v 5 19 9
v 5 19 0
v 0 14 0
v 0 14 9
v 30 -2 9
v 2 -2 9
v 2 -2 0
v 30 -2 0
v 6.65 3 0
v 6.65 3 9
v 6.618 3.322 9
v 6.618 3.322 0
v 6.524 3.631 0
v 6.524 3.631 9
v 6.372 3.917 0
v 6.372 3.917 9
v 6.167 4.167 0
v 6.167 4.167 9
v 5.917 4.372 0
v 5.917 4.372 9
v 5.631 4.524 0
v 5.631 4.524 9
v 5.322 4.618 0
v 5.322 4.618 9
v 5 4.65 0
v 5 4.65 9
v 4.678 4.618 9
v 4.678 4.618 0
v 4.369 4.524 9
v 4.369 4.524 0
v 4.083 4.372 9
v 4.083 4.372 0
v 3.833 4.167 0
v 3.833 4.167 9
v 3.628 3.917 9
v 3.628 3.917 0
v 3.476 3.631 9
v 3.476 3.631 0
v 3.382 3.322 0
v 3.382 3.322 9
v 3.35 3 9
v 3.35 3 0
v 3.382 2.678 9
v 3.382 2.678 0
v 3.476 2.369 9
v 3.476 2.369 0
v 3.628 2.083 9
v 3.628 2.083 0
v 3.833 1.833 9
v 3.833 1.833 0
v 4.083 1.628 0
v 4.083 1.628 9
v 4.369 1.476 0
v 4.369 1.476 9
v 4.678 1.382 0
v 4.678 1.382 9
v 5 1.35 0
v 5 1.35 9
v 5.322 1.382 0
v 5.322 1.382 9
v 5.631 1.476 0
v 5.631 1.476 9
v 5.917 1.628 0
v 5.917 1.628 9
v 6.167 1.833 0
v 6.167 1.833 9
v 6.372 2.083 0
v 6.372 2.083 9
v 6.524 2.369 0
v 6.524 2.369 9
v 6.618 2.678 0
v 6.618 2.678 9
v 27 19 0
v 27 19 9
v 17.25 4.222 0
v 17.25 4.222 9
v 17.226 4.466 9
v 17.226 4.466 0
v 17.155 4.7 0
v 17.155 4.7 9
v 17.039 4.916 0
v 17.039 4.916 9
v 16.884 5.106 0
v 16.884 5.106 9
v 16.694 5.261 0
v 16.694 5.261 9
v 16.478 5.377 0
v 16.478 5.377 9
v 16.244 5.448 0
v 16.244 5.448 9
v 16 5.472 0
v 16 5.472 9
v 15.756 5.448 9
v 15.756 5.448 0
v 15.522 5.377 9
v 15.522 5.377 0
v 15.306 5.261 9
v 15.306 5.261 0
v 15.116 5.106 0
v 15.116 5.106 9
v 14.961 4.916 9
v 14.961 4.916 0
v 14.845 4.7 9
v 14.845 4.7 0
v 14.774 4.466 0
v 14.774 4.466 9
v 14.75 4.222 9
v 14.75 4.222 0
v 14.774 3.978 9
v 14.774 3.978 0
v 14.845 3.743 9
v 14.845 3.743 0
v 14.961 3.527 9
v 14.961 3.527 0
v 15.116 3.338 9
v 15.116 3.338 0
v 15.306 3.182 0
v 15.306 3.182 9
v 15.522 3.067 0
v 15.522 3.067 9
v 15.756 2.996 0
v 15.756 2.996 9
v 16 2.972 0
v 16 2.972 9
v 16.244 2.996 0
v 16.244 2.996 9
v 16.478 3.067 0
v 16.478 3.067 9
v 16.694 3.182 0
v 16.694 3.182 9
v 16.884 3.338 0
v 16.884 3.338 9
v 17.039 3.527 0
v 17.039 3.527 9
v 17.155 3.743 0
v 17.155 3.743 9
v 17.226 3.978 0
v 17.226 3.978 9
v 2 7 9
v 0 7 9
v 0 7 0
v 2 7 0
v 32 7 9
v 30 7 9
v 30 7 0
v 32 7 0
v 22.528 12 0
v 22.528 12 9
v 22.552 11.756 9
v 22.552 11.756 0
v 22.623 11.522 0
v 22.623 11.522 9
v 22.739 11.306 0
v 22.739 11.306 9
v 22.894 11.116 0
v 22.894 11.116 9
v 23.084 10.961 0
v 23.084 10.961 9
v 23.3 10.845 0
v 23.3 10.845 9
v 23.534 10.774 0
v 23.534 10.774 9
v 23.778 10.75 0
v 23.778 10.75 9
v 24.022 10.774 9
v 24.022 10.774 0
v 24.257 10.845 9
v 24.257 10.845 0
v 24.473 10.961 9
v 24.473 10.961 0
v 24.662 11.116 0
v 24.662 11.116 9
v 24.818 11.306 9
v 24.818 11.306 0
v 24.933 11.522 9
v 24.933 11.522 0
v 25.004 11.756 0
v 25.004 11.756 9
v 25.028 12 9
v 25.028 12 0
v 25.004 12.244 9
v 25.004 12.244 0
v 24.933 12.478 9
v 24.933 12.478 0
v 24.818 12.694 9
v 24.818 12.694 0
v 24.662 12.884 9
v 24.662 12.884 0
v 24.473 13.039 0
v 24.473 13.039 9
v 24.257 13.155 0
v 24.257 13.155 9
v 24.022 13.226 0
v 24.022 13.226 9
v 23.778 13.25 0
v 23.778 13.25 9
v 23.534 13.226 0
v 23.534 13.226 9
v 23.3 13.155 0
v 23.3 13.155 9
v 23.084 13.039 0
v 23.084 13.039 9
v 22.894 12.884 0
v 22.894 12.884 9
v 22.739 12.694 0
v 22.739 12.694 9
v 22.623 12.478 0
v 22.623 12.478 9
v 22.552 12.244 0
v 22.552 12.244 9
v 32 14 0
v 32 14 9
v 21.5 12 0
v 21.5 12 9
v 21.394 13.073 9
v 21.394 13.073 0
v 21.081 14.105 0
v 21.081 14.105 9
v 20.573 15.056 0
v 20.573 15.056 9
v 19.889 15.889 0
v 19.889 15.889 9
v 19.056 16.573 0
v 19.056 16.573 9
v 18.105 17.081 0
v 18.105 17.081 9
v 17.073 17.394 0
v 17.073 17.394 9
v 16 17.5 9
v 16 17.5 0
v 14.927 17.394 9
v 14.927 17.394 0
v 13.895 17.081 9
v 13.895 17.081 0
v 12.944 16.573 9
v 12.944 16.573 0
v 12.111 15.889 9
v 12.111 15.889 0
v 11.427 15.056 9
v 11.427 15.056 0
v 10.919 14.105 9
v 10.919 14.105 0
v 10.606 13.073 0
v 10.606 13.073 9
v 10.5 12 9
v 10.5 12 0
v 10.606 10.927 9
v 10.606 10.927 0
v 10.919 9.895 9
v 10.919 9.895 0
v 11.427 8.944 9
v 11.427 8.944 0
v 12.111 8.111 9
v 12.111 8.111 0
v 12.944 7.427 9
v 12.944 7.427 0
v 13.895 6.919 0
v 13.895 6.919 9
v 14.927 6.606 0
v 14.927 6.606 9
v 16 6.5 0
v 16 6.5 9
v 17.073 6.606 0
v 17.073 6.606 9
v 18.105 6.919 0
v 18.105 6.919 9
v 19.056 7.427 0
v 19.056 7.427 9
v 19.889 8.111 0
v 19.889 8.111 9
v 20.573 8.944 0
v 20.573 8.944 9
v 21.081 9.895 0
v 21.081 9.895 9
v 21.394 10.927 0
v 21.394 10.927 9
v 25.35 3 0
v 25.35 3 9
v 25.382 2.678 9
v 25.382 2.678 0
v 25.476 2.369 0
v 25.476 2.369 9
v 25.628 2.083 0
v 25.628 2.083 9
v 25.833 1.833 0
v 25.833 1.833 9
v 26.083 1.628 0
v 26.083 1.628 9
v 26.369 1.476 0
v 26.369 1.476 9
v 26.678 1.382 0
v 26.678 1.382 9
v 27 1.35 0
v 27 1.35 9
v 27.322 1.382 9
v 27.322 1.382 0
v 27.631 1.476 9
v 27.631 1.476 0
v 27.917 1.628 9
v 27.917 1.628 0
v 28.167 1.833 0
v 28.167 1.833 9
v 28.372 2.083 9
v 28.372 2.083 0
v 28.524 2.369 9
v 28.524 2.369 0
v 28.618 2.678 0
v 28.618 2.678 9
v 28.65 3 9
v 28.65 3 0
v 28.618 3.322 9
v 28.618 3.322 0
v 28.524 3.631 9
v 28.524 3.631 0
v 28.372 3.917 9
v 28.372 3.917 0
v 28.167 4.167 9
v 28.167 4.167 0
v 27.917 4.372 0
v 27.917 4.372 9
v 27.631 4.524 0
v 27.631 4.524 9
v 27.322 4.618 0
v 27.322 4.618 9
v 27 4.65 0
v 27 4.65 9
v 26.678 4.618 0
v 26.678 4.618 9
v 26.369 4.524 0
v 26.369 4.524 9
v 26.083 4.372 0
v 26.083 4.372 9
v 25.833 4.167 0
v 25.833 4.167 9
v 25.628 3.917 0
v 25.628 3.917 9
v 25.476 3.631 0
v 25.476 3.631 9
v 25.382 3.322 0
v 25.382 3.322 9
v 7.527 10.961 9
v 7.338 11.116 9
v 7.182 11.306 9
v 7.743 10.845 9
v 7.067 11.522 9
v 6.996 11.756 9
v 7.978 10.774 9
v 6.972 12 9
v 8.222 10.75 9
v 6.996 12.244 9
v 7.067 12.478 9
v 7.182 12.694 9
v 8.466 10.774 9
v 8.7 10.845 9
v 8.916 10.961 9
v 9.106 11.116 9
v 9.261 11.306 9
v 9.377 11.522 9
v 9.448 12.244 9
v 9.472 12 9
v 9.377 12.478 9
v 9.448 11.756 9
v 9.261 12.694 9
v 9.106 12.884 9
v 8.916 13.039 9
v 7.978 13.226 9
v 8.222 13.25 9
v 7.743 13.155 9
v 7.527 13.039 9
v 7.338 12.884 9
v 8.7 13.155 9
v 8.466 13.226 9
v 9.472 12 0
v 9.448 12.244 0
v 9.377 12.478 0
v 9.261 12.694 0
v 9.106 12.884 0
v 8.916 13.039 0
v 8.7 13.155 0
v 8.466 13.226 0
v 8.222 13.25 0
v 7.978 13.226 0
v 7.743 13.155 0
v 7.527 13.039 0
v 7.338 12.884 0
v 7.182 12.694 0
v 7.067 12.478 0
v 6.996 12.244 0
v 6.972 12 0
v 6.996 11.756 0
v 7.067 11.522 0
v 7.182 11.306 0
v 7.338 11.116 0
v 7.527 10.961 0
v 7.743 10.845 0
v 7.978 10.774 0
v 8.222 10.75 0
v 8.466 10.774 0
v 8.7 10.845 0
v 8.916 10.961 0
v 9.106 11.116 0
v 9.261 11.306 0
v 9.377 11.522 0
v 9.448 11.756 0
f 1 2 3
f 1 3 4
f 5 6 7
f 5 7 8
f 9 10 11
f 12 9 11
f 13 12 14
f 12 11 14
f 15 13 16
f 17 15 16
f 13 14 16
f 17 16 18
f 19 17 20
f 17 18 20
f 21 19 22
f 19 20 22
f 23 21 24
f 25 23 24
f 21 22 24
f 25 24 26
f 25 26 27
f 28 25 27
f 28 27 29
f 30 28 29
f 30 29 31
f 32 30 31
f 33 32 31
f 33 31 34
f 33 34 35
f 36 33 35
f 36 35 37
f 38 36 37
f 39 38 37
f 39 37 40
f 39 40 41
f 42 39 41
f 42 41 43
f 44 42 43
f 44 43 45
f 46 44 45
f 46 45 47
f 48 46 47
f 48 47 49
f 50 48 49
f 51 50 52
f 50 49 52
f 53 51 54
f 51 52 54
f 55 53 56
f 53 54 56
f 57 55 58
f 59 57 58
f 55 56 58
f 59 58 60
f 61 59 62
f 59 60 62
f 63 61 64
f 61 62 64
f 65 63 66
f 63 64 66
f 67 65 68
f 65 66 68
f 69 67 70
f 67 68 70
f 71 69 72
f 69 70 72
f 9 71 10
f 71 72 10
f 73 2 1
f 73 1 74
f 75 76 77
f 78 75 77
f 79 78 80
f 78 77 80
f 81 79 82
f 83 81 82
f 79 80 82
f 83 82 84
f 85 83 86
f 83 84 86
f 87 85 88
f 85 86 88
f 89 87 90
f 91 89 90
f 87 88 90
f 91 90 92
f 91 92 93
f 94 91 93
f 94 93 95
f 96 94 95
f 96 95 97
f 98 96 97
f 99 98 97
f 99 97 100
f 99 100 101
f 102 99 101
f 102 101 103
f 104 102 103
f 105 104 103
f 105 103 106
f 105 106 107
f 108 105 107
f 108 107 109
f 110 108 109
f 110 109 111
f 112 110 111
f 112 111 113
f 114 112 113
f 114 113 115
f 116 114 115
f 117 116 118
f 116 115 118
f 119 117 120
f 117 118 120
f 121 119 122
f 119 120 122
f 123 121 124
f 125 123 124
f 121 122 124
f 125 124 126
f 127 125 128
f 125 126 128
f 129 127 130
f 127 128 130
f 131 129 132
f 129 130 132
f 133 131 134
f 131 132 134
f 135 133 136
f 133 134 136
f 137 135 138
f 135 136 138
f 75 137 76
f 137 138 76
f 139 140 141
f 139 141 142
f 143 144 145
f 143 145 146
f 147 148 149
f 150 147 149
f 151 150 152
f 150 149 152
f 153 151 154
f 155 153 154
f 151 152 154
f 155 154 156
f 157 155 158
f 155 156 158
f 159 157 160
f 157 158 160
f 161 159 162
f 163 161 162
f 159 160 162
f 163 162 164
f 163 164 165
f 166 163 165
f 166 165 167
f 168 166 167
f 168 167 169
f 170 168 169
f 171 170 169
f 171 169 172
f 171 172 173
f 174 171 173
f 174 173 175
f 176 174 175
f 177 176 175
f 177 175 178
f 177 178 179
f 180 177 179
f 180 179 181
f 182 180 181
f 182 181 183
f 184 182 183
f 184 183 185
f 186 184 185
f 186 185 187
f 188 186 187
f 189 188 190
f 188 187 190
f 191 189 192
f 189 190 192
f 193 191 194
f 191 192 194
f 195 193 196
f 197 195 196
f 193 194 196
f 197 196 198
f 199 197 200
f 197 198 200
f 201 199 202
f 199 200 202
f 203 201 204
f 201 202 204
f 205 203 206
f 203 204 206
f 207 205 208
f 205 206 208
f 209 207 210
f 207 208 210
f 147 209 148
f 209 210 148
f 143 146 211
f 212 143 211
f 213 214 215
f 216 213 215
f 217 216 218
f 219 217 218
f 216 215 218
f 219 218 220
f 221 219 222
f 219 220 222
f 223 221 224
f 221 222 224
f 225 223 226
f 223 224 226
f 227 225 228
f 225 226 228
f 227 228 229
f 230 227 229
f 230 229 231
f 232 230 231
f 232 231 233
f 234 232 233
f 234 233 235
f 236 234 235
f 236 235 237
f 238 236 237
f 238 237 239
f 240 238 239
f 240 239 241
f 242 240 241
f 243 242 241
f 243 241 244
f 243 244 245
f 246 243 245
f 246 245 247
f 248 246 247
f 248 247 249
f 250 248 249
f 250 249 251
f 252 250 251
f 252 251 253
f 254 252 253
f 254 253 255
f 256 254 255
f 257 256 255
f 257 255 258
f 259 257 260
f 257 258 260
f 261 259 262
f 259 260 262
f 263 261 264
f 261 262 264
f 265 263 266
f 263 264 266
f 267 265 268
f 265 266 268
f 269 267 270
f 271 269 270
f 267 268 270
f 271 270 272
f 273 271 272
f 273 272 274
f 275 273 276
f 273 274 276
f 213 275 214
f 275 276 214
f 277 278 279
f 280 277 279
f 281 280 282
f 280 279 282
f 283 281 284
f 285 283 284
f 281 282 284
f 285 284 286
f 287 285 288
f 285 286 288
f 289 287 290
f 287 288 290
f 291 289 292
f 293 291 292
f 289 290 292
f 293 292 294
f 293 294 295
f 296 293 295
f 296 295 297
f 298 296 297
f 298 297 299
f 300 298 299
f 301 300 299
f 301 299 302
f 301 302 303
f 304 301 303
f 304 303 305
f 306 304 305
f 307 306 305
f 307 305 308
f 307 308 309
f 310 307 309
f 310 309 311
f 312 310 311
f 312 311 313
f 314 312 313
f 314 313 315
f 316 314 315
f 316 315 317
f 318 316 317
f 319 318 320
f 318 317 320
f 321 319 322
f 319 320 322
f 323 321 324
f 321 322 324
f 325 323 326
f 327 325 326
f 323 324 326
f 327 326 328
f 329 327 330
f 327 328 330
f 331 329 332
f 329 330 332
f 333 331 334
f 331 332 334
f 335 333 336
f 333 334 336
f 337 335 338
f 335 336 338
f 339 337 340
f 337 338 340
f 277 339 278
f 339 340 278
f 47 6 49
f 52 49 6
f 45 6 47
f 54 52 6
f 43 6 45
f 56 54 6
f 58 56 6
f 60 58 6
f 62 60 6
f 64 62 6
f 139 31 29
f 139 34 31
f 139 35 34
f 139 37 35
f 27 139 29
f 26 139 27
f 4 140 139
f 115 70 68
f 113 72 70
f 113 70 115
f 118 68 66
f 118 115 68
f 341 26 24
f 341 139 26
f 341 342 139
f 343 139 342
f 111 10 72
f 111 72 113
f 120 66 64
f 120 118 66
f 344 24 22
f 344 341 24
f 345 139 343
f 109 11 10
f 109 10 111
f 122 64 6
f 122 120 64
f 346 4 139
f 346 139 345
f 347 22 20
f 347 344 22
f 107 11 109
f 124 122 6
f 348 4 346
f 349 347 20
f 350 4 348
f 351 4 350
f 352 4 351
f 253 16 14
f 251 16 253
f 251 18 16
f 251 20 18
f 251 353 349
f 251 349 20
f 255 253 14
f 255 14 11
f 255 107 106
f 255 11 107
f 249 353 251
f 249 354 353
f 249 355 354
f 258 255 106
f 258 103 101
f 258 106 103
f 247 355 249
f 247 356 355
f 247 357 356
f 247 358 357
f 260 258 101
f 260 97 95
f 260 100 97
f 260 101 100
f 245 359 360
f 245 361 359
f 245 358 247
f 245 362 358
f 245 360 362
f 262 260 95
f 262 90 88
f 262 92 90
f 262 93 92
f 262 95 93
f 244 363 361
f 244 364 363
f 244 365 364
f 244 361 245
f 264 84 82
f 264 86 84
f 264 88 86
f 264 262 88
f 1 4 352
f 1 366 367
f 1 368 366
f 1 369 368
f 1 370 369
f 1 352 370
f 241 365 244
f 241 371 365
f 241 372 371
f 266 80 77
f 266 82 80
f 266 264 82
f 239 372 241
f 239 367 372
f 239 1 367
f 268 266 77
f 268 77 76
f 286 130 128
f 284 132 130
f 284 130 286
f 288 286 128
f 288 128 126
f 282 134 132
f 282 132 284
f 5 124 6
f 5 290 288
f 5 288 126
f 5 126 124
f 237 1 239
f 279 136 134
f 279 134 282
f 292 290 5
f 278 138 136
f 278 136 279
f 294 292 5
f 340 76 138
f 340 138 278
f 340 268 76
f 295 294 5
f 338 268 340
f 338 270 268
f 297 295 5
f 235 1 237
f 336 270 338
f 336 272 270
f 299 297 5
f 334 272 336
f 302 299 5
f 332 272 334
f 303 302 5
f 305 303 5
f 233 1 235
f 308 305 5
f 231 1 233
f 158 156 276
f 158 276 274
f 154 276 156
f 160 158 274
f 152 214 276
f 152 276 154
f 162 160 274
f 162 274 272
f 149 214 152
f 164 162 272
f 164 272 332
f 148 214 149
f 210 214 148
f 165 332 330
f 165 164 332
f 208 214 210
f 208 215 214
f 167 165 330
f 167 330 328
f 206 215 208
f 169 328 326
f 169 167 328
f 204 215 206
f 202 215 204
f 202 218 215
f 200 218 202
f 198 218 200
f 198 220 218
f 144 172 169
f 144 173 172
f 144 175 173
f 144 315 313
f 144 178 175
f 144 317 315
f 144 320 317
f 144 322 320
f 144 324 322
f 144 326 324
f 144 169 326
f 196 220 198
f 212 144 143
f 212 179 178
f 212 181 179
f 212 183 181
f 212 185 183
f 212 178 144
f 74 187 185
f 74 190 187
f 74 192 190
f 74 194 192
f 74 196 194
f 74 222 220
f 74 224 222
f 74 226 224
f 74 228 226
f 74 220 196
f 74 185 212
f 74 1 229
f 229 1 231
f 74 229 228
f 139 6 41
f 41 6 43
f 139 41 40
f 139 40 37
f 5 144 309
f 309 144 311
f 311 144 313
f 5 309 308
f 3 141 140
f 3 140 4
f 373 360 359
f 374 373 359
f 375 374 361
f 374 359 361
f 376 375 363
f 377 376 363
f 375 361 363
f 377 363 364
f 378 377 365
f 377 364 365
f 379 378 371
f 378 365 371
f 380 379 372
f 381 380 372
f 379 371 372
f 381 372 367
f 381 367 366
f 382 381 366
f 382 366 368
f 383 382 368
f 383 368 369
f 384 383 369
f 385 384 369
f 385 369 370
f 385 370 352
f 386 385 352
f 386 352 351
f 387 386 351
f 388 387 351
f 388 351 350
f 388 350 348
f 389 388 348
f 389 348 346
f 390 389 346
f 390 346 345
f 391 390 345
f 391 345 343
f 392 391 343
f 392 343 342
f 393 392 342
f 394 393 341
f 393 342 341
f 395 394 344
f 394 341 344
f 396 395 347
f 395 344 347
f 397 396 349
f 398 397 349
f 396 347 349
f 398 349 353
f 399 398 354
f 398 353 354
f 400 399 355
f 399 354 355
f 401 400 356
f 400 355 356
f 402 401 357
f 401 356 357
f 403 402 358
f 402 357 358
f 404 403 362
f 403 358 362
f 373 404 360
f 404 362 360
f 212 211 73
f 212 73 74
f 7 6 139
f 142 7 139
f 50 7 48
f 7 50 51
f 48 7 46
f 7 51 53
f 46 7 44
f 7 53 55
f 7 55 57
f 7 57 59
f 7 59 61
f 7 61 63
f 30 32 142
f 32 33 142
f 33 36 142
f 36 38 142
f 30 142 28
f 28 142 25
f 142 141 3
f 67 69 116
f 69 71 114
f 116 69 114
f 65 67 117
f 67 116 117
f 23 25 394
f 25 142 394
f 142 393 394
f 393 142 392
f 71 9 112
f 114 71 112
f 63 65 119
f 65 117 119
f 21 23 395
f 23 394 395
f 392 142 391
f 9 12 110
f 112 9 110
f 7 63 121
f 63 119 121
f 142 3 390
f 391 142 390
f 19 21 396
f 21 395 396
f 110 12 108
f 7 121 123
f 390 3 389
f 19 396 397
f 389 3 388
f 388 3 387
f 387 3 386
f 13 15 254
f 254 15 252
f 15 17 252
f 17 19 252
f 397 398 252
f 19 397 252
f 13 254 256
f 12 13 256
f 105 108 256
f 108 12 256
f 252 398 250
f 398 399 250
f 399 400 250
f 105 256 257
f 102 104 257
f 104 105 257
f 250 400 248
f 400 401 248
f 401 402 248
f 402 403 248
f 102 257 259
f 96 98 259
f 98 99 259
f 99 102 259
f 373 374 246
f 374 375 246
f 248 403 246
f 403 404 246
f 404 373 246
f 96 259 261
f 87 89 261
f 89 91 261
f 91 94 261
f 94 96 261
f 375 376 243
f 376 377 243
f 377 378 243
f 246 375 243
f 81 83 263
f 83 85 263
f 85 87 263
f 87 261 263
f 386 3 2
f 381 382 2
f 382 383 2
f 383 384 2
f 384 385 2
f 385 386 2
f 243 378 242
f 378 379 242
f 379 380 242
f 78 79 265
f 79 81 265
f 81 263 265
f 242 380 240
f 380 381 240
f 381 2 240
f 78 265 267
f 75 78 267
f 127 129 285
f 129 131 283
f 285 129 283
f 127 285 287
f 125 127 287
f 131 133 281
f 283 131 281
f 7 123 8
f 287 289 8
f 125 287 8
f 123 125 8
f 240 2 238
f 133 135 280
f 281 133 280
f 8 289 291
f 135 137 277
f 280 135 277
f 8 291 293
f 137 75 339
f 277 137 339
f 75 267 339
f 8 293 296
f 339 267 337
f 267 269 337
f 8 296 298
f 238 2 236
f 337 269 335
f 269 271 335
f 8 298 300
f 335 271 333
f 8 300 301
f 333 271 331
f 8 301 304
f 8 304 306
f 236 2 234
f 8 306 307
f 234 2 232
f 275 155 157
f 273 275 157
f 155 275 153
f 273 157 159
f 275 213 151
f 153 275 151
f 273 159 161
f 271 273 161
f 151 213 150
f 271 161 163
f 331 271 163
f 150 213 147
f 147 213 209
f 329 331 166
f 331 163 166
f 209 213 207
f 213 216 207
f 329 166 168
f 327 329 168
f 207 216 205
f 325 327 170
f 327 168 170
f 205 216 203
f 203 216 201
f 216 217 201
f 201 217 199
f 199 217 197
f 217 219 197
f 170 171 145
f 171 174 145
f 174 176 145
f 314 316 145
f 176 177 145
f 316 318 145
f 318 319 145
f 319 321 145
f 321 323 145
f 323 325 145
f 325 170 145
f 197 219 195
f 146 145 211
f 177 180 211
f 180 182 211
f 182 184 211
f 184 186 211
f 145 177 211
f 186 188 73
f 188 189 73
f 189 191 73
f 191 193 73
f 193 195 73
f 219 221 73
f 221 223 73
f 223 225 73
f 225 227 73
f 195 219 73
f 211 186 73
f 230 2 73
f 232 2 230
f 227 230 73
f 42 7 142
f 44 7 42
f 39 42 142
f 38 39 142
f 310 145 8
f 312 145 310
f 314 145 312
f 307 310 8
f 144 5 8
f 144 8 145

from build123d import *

# Parameters (mm, degrees)
ESQUISSE1_W             = 32
ESQUISSE1_H             = 19
BOSS_EXTRU_1_DEPTH      = 9
ESQUISSE2_R             = 5.5
ESQUISSE2_R_2           = 1.25
ESQUISSE2_R_3           = 1.65
ENL_V_MAT_EXTRU_1_DEPTH = 39.288379438
ESQUISSE3_W             = 2
ESQUISSE3_H             = 7
ENL_V_MAT_EXTRU_2_DEPTH = 39.288379438
ESQUISSE4_W             = 28
ESQUISSE4_H             = 2
BOSS_EXTRU_2_DEPTH      = 9
CHANFREIN1_SIZE         = 5


with BuildPart() as part:
    # Esquisse1 → Boss.-Extru.1 (new body)
    with BuildSketch(Plane.XY):
        with Locations((16, 9.5)):
            Rectangle(ESQUISSE1_W, ESQUISSE1_H)
    extrude(amount=BOSS_EXTRU_1_DEPTH)

    # Esquisse2 → Enlèv. mat.-Extru.1 (cut, through all)
    with BuildSketch(Plane.XY.offset(9)):
        with Locations((16, 12)):
            Circle(ESQUISSE2_R)
        with Locations((8.221825407, 12)):
            Circle(ESQUISSE2_R_2)
        with Locations(Location((23.778174593, 12, 0), (0, 0, 180))):
            Circle(ESQUISSE2_R_2)
        with Locations((16, 4.221825407)):
            Circle(ESQUISSE2_R_2)
        with Locations((5, 3)):
            Circle(ESQUISSE2_R_3)
        with Locations(Location((27, 3, 0), (0, 0, 180))):
            Circle(ESQUISSE2_R_3)
    extrude(amount=-ENL_V_MAT_EXTRU_1_DEPTH, mode=Mode.SUBTRACT)

    # Esquisse3 → Enlèv. mat.-Extru.2 (cut, through all)
    with BuildSketch(Plane.XY.offset(9)):
        with Locations((1, 3.5)):
            Rectangle(ESQUISSE3_W, ESQUISSE3_H)
        with Locations((31, 3.5)):
            Rectangle(ESQUISSE3_W, ESQUISSE3_H)
    extrude(amount=-ENL_V_MAT_EXTRU_2_DEPTH, mode=Mode.SUBTRACT)

    # Esquisse4 → Boss.-Extru.2 (add)
    with BuildSketch(Plane.XY.offset(9)):
        with Locations((16, -1)):
            Rectangle(ESQUISSE4_W, ESQUISSE4_H)
    extrude(amount=-BOSS_EXTRU_2_DEPTH)

    # Chanfrein1
    chanfrein1_edges = [part.edges().sort_by_distance(p)[0] for p in [
        (0, 19, 4.5),
        (32, 19, 4.5),
    ]]
    chamfer(chanfrein1_edges, length=CHANFREIN1_SIZE)


solid = part.part
